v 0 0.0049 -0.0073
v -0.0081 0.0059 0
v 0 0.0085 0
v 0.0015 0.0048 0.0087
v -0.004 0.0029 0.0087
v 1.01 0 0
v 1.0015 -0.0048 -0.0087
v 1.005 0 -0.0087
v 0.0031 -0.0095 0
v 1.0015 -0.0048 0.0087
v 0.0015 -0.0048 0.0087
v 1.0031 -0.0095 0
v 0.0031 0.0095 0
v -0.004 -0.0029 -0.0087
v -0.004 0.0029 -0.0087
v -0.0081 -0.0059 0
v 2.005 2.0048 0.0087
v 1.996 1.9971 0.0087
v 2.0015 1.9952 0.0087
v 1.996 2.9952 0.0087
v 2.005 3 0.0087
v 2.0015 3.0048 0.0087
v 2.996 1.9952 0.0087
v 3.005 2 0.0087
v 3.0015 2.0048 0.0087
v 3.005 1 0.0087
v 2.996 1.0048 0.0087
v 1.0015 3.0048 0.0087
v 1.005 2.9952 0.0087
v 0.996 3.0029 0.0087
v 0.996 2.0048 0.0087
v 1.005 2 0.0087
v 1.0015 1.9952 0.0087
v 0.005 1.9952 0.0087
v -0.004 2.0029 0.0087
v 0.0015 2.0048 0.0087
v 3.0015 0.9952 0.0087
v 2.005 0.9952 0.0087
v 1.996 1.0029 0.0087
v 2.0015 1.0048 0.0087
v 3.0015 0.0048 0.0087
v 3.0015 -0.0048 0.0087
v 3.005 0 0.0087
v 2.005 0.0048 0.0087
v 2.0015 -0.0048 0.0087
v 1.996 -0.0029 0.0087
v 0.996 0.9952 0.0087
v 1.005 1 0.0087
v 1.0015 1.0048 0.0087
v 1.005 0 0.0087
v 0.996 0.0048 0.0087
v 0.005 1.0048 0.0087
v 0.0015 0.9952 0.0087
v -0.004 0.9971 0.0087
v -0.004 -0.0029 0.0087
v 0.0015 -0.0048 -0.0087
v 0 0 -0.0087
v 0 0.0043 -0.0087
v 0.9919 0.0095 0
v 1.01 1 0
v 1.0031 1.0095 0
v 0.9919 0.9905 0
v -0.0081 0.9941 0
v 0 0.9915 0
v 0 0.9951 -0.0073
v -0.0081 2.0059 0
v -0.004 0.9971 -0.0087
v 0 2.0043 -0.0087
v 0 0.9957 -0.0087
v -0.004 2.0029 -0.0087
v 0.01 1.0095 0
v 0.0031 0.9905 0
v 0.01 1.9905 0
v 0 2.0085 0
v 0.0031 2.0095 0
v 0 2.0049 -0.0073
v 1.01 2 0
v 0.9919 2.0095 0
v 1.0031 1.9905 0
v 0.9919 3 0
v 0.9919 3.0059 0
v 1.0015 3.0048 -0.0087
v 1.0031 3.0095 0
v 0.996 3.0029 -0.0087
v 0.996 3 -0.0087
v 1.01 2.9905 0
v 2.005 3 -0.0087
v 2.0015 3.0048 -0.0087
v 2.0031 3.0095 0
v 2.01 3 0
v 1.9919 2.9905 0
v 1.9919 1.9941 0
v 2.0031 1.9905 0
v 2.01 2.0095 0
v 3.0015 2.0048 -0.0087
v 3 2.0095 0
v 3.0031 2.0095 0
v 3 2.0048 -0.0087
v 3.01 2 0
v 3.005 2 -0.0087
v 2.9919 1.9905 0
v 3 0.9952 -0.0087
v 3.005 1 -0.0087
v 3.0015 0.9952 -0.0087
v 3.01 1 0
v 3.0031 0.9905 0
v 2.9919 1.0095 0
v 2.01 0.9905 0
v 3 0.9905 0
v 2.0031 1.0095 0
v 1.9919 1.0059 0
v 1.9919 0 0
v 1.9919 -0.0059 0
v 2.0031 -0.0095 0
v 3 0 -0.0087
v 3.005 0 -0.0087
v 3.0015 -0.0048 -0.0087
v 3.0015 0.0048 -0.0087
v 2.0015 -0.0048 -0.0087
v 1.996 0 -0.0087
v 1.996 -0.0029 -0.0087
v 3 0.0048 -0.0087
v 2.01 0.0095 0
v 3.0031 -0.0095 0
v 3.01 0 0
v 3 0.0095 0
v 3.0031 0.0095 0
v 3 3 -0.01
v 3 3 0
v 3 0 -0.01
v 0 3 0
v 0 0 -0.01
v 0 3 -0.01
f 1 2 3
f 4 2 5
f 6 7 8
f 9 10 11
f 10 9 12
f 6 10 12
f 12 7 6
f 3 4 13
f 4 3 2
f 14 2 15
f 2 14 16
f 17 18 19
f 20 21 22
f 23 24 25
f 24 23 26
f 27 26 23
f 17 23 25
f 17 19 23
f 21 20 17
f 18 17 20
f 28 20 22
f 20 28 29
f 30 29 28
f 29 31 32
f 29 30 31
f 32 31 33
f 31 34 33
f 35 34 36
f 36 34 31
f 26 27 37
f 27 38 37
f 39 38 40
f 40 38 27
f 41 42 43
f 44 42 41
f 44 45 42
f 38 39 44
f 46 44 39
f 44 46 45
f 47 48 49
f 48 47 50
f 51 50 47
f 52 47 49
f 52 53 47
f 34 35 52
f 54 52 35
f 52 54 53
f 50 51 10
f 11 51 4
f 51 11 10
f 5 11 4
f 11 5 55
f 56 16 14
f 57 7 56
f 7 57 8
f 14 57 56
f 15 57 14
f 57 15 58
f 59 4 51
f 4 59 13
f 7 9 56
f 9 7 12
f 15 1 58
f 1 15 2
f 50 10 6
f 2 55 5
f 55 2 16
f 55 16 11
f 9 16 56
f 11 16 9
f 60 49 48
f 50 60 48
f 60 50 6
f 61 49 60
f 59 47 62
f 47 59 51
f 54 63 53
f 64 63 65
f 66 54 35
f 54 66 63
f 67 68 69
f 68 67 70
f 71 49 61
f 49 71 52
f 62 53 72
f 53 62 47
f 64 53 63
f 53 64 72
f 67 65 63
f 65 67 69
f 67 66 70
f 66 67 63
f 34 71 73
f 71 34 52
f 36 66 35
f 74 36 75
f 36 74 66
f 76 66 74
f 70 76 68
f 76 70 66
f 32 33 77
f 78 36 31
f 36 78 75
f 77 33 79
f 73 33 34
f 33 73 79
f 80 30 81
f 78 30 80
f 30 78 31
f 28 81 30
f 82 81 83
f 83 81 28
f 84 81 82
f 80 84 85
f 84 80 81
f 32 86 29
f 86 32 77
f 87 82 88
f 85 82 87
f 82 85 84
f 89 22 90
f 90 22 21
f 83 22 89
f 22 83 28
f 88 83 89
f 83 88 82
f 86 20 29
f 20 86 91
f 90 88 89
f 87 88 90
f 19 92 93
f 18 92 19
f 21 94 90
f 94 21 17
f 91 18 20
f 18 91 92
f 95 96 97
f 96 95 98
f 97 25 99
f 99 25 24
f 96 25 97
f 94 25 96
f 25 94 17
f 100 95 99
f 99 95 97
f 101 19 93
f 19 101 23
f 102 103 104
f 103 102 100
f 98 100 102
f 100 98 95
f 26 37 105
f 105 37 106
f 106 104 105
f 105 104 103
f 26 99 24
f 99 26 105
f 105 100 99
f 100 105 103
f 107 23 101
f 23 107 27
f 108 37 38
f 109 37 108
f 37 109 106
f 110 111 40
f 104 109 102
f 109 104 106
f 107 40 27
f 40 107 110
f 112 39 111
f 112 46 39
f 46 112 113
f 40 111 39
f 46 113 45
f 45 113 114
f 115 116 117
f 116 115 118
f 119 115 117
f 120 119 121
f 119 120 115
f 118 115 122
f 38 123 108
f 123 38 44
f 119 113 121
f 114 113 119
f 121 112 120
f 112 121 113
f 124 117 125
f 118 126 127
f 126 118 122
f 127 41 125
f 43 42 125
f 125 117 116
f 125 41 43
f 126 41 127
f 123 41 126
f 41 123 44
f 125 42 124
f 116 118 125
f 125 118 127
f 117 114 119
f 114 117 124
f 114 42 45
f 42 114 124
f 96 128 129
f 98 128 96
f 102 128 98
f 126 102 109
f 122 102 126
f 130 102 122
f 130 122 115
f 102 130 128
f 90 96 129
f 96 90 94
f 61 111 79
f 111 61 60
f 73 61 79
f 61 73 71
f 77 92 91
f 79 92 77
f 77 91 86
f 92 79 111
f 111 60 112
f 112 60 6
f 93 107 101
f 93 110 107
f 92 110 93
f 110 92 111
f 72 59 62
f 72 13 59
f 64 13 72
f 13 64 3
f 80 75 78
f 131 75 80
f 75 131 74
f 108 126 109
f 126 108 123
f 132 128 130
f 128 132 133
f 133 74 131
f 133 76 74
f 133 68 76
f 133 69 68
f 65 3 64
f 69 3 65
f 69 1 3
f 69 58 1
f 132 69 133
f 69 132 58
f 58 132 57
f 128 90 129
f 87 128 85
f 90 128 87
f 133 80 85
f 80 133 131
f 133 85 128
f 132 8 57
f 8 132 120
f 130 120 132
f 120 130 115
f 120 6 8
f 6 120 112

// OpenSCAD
hull(){
    translate([0.0, 0.0]) sphere(0.01);
    translate([1.0, 0.0]) sphere(0.01);
}
hull(){
    translate([1.0, 0.0]) sphere(0.01);
    translate([1.0, 1.0]) sphere(0.01);
}
hull(){
    translate([1.0, 1.0]) sphere(0.01);
    translate([0.0, 1.0]) sphere(0.01);
}
hull(){
    translate([0.0, 1.0]) sphere(0.01);
    translate([0.0, 2.0]) sphere(0.01);
}
hull(){
    translate([0.0, 2.0]) sphere(0.01);
    translate([1.0, 2.0]) sphere(0.01);
}
hull(){
    translate([1.0, 2.0]) sphere(0.01);
    translate([1.0, 3.0]) sphere(0.01);
}
hull(){
    translate([1.0, 3.0]) sphere(0.01);
    translate([2.0, 3.0]) sphere(0.01);
}
hull(){
    translate([2.0, 3.0]) sphere(0.01);
    translate([2.0, 2.0]) sphere(0.01);
}
hull(){
    translate([2.0, 2.0]) sphere(0.01);
    translate([3.0, 2.0]) sphere(0.01);
}
hull(){
    translate([3.0, 2.0]) sphere(0.01);
    translate([3.0, 1.0]) sphere(0.01);
}
hull(){
    translate([3.0, 1.0]) sphere(0.01);
    translate([2.0, 1.0]) sphere(0.01);
}
hull(){
    translate([2.0, 1.0]) sphere(0.01);
    translate([2.0, 0.0]) sphere(0.01);
}
hull(){
    translate([2.0, 0.0]) sphere(0.01);
    translate([3.0, 0.0]) sphere(0.01);
}
translate([0,0,-0.01]) color([0.1,0.1,0.1]) cube([3,3,0.01]);
